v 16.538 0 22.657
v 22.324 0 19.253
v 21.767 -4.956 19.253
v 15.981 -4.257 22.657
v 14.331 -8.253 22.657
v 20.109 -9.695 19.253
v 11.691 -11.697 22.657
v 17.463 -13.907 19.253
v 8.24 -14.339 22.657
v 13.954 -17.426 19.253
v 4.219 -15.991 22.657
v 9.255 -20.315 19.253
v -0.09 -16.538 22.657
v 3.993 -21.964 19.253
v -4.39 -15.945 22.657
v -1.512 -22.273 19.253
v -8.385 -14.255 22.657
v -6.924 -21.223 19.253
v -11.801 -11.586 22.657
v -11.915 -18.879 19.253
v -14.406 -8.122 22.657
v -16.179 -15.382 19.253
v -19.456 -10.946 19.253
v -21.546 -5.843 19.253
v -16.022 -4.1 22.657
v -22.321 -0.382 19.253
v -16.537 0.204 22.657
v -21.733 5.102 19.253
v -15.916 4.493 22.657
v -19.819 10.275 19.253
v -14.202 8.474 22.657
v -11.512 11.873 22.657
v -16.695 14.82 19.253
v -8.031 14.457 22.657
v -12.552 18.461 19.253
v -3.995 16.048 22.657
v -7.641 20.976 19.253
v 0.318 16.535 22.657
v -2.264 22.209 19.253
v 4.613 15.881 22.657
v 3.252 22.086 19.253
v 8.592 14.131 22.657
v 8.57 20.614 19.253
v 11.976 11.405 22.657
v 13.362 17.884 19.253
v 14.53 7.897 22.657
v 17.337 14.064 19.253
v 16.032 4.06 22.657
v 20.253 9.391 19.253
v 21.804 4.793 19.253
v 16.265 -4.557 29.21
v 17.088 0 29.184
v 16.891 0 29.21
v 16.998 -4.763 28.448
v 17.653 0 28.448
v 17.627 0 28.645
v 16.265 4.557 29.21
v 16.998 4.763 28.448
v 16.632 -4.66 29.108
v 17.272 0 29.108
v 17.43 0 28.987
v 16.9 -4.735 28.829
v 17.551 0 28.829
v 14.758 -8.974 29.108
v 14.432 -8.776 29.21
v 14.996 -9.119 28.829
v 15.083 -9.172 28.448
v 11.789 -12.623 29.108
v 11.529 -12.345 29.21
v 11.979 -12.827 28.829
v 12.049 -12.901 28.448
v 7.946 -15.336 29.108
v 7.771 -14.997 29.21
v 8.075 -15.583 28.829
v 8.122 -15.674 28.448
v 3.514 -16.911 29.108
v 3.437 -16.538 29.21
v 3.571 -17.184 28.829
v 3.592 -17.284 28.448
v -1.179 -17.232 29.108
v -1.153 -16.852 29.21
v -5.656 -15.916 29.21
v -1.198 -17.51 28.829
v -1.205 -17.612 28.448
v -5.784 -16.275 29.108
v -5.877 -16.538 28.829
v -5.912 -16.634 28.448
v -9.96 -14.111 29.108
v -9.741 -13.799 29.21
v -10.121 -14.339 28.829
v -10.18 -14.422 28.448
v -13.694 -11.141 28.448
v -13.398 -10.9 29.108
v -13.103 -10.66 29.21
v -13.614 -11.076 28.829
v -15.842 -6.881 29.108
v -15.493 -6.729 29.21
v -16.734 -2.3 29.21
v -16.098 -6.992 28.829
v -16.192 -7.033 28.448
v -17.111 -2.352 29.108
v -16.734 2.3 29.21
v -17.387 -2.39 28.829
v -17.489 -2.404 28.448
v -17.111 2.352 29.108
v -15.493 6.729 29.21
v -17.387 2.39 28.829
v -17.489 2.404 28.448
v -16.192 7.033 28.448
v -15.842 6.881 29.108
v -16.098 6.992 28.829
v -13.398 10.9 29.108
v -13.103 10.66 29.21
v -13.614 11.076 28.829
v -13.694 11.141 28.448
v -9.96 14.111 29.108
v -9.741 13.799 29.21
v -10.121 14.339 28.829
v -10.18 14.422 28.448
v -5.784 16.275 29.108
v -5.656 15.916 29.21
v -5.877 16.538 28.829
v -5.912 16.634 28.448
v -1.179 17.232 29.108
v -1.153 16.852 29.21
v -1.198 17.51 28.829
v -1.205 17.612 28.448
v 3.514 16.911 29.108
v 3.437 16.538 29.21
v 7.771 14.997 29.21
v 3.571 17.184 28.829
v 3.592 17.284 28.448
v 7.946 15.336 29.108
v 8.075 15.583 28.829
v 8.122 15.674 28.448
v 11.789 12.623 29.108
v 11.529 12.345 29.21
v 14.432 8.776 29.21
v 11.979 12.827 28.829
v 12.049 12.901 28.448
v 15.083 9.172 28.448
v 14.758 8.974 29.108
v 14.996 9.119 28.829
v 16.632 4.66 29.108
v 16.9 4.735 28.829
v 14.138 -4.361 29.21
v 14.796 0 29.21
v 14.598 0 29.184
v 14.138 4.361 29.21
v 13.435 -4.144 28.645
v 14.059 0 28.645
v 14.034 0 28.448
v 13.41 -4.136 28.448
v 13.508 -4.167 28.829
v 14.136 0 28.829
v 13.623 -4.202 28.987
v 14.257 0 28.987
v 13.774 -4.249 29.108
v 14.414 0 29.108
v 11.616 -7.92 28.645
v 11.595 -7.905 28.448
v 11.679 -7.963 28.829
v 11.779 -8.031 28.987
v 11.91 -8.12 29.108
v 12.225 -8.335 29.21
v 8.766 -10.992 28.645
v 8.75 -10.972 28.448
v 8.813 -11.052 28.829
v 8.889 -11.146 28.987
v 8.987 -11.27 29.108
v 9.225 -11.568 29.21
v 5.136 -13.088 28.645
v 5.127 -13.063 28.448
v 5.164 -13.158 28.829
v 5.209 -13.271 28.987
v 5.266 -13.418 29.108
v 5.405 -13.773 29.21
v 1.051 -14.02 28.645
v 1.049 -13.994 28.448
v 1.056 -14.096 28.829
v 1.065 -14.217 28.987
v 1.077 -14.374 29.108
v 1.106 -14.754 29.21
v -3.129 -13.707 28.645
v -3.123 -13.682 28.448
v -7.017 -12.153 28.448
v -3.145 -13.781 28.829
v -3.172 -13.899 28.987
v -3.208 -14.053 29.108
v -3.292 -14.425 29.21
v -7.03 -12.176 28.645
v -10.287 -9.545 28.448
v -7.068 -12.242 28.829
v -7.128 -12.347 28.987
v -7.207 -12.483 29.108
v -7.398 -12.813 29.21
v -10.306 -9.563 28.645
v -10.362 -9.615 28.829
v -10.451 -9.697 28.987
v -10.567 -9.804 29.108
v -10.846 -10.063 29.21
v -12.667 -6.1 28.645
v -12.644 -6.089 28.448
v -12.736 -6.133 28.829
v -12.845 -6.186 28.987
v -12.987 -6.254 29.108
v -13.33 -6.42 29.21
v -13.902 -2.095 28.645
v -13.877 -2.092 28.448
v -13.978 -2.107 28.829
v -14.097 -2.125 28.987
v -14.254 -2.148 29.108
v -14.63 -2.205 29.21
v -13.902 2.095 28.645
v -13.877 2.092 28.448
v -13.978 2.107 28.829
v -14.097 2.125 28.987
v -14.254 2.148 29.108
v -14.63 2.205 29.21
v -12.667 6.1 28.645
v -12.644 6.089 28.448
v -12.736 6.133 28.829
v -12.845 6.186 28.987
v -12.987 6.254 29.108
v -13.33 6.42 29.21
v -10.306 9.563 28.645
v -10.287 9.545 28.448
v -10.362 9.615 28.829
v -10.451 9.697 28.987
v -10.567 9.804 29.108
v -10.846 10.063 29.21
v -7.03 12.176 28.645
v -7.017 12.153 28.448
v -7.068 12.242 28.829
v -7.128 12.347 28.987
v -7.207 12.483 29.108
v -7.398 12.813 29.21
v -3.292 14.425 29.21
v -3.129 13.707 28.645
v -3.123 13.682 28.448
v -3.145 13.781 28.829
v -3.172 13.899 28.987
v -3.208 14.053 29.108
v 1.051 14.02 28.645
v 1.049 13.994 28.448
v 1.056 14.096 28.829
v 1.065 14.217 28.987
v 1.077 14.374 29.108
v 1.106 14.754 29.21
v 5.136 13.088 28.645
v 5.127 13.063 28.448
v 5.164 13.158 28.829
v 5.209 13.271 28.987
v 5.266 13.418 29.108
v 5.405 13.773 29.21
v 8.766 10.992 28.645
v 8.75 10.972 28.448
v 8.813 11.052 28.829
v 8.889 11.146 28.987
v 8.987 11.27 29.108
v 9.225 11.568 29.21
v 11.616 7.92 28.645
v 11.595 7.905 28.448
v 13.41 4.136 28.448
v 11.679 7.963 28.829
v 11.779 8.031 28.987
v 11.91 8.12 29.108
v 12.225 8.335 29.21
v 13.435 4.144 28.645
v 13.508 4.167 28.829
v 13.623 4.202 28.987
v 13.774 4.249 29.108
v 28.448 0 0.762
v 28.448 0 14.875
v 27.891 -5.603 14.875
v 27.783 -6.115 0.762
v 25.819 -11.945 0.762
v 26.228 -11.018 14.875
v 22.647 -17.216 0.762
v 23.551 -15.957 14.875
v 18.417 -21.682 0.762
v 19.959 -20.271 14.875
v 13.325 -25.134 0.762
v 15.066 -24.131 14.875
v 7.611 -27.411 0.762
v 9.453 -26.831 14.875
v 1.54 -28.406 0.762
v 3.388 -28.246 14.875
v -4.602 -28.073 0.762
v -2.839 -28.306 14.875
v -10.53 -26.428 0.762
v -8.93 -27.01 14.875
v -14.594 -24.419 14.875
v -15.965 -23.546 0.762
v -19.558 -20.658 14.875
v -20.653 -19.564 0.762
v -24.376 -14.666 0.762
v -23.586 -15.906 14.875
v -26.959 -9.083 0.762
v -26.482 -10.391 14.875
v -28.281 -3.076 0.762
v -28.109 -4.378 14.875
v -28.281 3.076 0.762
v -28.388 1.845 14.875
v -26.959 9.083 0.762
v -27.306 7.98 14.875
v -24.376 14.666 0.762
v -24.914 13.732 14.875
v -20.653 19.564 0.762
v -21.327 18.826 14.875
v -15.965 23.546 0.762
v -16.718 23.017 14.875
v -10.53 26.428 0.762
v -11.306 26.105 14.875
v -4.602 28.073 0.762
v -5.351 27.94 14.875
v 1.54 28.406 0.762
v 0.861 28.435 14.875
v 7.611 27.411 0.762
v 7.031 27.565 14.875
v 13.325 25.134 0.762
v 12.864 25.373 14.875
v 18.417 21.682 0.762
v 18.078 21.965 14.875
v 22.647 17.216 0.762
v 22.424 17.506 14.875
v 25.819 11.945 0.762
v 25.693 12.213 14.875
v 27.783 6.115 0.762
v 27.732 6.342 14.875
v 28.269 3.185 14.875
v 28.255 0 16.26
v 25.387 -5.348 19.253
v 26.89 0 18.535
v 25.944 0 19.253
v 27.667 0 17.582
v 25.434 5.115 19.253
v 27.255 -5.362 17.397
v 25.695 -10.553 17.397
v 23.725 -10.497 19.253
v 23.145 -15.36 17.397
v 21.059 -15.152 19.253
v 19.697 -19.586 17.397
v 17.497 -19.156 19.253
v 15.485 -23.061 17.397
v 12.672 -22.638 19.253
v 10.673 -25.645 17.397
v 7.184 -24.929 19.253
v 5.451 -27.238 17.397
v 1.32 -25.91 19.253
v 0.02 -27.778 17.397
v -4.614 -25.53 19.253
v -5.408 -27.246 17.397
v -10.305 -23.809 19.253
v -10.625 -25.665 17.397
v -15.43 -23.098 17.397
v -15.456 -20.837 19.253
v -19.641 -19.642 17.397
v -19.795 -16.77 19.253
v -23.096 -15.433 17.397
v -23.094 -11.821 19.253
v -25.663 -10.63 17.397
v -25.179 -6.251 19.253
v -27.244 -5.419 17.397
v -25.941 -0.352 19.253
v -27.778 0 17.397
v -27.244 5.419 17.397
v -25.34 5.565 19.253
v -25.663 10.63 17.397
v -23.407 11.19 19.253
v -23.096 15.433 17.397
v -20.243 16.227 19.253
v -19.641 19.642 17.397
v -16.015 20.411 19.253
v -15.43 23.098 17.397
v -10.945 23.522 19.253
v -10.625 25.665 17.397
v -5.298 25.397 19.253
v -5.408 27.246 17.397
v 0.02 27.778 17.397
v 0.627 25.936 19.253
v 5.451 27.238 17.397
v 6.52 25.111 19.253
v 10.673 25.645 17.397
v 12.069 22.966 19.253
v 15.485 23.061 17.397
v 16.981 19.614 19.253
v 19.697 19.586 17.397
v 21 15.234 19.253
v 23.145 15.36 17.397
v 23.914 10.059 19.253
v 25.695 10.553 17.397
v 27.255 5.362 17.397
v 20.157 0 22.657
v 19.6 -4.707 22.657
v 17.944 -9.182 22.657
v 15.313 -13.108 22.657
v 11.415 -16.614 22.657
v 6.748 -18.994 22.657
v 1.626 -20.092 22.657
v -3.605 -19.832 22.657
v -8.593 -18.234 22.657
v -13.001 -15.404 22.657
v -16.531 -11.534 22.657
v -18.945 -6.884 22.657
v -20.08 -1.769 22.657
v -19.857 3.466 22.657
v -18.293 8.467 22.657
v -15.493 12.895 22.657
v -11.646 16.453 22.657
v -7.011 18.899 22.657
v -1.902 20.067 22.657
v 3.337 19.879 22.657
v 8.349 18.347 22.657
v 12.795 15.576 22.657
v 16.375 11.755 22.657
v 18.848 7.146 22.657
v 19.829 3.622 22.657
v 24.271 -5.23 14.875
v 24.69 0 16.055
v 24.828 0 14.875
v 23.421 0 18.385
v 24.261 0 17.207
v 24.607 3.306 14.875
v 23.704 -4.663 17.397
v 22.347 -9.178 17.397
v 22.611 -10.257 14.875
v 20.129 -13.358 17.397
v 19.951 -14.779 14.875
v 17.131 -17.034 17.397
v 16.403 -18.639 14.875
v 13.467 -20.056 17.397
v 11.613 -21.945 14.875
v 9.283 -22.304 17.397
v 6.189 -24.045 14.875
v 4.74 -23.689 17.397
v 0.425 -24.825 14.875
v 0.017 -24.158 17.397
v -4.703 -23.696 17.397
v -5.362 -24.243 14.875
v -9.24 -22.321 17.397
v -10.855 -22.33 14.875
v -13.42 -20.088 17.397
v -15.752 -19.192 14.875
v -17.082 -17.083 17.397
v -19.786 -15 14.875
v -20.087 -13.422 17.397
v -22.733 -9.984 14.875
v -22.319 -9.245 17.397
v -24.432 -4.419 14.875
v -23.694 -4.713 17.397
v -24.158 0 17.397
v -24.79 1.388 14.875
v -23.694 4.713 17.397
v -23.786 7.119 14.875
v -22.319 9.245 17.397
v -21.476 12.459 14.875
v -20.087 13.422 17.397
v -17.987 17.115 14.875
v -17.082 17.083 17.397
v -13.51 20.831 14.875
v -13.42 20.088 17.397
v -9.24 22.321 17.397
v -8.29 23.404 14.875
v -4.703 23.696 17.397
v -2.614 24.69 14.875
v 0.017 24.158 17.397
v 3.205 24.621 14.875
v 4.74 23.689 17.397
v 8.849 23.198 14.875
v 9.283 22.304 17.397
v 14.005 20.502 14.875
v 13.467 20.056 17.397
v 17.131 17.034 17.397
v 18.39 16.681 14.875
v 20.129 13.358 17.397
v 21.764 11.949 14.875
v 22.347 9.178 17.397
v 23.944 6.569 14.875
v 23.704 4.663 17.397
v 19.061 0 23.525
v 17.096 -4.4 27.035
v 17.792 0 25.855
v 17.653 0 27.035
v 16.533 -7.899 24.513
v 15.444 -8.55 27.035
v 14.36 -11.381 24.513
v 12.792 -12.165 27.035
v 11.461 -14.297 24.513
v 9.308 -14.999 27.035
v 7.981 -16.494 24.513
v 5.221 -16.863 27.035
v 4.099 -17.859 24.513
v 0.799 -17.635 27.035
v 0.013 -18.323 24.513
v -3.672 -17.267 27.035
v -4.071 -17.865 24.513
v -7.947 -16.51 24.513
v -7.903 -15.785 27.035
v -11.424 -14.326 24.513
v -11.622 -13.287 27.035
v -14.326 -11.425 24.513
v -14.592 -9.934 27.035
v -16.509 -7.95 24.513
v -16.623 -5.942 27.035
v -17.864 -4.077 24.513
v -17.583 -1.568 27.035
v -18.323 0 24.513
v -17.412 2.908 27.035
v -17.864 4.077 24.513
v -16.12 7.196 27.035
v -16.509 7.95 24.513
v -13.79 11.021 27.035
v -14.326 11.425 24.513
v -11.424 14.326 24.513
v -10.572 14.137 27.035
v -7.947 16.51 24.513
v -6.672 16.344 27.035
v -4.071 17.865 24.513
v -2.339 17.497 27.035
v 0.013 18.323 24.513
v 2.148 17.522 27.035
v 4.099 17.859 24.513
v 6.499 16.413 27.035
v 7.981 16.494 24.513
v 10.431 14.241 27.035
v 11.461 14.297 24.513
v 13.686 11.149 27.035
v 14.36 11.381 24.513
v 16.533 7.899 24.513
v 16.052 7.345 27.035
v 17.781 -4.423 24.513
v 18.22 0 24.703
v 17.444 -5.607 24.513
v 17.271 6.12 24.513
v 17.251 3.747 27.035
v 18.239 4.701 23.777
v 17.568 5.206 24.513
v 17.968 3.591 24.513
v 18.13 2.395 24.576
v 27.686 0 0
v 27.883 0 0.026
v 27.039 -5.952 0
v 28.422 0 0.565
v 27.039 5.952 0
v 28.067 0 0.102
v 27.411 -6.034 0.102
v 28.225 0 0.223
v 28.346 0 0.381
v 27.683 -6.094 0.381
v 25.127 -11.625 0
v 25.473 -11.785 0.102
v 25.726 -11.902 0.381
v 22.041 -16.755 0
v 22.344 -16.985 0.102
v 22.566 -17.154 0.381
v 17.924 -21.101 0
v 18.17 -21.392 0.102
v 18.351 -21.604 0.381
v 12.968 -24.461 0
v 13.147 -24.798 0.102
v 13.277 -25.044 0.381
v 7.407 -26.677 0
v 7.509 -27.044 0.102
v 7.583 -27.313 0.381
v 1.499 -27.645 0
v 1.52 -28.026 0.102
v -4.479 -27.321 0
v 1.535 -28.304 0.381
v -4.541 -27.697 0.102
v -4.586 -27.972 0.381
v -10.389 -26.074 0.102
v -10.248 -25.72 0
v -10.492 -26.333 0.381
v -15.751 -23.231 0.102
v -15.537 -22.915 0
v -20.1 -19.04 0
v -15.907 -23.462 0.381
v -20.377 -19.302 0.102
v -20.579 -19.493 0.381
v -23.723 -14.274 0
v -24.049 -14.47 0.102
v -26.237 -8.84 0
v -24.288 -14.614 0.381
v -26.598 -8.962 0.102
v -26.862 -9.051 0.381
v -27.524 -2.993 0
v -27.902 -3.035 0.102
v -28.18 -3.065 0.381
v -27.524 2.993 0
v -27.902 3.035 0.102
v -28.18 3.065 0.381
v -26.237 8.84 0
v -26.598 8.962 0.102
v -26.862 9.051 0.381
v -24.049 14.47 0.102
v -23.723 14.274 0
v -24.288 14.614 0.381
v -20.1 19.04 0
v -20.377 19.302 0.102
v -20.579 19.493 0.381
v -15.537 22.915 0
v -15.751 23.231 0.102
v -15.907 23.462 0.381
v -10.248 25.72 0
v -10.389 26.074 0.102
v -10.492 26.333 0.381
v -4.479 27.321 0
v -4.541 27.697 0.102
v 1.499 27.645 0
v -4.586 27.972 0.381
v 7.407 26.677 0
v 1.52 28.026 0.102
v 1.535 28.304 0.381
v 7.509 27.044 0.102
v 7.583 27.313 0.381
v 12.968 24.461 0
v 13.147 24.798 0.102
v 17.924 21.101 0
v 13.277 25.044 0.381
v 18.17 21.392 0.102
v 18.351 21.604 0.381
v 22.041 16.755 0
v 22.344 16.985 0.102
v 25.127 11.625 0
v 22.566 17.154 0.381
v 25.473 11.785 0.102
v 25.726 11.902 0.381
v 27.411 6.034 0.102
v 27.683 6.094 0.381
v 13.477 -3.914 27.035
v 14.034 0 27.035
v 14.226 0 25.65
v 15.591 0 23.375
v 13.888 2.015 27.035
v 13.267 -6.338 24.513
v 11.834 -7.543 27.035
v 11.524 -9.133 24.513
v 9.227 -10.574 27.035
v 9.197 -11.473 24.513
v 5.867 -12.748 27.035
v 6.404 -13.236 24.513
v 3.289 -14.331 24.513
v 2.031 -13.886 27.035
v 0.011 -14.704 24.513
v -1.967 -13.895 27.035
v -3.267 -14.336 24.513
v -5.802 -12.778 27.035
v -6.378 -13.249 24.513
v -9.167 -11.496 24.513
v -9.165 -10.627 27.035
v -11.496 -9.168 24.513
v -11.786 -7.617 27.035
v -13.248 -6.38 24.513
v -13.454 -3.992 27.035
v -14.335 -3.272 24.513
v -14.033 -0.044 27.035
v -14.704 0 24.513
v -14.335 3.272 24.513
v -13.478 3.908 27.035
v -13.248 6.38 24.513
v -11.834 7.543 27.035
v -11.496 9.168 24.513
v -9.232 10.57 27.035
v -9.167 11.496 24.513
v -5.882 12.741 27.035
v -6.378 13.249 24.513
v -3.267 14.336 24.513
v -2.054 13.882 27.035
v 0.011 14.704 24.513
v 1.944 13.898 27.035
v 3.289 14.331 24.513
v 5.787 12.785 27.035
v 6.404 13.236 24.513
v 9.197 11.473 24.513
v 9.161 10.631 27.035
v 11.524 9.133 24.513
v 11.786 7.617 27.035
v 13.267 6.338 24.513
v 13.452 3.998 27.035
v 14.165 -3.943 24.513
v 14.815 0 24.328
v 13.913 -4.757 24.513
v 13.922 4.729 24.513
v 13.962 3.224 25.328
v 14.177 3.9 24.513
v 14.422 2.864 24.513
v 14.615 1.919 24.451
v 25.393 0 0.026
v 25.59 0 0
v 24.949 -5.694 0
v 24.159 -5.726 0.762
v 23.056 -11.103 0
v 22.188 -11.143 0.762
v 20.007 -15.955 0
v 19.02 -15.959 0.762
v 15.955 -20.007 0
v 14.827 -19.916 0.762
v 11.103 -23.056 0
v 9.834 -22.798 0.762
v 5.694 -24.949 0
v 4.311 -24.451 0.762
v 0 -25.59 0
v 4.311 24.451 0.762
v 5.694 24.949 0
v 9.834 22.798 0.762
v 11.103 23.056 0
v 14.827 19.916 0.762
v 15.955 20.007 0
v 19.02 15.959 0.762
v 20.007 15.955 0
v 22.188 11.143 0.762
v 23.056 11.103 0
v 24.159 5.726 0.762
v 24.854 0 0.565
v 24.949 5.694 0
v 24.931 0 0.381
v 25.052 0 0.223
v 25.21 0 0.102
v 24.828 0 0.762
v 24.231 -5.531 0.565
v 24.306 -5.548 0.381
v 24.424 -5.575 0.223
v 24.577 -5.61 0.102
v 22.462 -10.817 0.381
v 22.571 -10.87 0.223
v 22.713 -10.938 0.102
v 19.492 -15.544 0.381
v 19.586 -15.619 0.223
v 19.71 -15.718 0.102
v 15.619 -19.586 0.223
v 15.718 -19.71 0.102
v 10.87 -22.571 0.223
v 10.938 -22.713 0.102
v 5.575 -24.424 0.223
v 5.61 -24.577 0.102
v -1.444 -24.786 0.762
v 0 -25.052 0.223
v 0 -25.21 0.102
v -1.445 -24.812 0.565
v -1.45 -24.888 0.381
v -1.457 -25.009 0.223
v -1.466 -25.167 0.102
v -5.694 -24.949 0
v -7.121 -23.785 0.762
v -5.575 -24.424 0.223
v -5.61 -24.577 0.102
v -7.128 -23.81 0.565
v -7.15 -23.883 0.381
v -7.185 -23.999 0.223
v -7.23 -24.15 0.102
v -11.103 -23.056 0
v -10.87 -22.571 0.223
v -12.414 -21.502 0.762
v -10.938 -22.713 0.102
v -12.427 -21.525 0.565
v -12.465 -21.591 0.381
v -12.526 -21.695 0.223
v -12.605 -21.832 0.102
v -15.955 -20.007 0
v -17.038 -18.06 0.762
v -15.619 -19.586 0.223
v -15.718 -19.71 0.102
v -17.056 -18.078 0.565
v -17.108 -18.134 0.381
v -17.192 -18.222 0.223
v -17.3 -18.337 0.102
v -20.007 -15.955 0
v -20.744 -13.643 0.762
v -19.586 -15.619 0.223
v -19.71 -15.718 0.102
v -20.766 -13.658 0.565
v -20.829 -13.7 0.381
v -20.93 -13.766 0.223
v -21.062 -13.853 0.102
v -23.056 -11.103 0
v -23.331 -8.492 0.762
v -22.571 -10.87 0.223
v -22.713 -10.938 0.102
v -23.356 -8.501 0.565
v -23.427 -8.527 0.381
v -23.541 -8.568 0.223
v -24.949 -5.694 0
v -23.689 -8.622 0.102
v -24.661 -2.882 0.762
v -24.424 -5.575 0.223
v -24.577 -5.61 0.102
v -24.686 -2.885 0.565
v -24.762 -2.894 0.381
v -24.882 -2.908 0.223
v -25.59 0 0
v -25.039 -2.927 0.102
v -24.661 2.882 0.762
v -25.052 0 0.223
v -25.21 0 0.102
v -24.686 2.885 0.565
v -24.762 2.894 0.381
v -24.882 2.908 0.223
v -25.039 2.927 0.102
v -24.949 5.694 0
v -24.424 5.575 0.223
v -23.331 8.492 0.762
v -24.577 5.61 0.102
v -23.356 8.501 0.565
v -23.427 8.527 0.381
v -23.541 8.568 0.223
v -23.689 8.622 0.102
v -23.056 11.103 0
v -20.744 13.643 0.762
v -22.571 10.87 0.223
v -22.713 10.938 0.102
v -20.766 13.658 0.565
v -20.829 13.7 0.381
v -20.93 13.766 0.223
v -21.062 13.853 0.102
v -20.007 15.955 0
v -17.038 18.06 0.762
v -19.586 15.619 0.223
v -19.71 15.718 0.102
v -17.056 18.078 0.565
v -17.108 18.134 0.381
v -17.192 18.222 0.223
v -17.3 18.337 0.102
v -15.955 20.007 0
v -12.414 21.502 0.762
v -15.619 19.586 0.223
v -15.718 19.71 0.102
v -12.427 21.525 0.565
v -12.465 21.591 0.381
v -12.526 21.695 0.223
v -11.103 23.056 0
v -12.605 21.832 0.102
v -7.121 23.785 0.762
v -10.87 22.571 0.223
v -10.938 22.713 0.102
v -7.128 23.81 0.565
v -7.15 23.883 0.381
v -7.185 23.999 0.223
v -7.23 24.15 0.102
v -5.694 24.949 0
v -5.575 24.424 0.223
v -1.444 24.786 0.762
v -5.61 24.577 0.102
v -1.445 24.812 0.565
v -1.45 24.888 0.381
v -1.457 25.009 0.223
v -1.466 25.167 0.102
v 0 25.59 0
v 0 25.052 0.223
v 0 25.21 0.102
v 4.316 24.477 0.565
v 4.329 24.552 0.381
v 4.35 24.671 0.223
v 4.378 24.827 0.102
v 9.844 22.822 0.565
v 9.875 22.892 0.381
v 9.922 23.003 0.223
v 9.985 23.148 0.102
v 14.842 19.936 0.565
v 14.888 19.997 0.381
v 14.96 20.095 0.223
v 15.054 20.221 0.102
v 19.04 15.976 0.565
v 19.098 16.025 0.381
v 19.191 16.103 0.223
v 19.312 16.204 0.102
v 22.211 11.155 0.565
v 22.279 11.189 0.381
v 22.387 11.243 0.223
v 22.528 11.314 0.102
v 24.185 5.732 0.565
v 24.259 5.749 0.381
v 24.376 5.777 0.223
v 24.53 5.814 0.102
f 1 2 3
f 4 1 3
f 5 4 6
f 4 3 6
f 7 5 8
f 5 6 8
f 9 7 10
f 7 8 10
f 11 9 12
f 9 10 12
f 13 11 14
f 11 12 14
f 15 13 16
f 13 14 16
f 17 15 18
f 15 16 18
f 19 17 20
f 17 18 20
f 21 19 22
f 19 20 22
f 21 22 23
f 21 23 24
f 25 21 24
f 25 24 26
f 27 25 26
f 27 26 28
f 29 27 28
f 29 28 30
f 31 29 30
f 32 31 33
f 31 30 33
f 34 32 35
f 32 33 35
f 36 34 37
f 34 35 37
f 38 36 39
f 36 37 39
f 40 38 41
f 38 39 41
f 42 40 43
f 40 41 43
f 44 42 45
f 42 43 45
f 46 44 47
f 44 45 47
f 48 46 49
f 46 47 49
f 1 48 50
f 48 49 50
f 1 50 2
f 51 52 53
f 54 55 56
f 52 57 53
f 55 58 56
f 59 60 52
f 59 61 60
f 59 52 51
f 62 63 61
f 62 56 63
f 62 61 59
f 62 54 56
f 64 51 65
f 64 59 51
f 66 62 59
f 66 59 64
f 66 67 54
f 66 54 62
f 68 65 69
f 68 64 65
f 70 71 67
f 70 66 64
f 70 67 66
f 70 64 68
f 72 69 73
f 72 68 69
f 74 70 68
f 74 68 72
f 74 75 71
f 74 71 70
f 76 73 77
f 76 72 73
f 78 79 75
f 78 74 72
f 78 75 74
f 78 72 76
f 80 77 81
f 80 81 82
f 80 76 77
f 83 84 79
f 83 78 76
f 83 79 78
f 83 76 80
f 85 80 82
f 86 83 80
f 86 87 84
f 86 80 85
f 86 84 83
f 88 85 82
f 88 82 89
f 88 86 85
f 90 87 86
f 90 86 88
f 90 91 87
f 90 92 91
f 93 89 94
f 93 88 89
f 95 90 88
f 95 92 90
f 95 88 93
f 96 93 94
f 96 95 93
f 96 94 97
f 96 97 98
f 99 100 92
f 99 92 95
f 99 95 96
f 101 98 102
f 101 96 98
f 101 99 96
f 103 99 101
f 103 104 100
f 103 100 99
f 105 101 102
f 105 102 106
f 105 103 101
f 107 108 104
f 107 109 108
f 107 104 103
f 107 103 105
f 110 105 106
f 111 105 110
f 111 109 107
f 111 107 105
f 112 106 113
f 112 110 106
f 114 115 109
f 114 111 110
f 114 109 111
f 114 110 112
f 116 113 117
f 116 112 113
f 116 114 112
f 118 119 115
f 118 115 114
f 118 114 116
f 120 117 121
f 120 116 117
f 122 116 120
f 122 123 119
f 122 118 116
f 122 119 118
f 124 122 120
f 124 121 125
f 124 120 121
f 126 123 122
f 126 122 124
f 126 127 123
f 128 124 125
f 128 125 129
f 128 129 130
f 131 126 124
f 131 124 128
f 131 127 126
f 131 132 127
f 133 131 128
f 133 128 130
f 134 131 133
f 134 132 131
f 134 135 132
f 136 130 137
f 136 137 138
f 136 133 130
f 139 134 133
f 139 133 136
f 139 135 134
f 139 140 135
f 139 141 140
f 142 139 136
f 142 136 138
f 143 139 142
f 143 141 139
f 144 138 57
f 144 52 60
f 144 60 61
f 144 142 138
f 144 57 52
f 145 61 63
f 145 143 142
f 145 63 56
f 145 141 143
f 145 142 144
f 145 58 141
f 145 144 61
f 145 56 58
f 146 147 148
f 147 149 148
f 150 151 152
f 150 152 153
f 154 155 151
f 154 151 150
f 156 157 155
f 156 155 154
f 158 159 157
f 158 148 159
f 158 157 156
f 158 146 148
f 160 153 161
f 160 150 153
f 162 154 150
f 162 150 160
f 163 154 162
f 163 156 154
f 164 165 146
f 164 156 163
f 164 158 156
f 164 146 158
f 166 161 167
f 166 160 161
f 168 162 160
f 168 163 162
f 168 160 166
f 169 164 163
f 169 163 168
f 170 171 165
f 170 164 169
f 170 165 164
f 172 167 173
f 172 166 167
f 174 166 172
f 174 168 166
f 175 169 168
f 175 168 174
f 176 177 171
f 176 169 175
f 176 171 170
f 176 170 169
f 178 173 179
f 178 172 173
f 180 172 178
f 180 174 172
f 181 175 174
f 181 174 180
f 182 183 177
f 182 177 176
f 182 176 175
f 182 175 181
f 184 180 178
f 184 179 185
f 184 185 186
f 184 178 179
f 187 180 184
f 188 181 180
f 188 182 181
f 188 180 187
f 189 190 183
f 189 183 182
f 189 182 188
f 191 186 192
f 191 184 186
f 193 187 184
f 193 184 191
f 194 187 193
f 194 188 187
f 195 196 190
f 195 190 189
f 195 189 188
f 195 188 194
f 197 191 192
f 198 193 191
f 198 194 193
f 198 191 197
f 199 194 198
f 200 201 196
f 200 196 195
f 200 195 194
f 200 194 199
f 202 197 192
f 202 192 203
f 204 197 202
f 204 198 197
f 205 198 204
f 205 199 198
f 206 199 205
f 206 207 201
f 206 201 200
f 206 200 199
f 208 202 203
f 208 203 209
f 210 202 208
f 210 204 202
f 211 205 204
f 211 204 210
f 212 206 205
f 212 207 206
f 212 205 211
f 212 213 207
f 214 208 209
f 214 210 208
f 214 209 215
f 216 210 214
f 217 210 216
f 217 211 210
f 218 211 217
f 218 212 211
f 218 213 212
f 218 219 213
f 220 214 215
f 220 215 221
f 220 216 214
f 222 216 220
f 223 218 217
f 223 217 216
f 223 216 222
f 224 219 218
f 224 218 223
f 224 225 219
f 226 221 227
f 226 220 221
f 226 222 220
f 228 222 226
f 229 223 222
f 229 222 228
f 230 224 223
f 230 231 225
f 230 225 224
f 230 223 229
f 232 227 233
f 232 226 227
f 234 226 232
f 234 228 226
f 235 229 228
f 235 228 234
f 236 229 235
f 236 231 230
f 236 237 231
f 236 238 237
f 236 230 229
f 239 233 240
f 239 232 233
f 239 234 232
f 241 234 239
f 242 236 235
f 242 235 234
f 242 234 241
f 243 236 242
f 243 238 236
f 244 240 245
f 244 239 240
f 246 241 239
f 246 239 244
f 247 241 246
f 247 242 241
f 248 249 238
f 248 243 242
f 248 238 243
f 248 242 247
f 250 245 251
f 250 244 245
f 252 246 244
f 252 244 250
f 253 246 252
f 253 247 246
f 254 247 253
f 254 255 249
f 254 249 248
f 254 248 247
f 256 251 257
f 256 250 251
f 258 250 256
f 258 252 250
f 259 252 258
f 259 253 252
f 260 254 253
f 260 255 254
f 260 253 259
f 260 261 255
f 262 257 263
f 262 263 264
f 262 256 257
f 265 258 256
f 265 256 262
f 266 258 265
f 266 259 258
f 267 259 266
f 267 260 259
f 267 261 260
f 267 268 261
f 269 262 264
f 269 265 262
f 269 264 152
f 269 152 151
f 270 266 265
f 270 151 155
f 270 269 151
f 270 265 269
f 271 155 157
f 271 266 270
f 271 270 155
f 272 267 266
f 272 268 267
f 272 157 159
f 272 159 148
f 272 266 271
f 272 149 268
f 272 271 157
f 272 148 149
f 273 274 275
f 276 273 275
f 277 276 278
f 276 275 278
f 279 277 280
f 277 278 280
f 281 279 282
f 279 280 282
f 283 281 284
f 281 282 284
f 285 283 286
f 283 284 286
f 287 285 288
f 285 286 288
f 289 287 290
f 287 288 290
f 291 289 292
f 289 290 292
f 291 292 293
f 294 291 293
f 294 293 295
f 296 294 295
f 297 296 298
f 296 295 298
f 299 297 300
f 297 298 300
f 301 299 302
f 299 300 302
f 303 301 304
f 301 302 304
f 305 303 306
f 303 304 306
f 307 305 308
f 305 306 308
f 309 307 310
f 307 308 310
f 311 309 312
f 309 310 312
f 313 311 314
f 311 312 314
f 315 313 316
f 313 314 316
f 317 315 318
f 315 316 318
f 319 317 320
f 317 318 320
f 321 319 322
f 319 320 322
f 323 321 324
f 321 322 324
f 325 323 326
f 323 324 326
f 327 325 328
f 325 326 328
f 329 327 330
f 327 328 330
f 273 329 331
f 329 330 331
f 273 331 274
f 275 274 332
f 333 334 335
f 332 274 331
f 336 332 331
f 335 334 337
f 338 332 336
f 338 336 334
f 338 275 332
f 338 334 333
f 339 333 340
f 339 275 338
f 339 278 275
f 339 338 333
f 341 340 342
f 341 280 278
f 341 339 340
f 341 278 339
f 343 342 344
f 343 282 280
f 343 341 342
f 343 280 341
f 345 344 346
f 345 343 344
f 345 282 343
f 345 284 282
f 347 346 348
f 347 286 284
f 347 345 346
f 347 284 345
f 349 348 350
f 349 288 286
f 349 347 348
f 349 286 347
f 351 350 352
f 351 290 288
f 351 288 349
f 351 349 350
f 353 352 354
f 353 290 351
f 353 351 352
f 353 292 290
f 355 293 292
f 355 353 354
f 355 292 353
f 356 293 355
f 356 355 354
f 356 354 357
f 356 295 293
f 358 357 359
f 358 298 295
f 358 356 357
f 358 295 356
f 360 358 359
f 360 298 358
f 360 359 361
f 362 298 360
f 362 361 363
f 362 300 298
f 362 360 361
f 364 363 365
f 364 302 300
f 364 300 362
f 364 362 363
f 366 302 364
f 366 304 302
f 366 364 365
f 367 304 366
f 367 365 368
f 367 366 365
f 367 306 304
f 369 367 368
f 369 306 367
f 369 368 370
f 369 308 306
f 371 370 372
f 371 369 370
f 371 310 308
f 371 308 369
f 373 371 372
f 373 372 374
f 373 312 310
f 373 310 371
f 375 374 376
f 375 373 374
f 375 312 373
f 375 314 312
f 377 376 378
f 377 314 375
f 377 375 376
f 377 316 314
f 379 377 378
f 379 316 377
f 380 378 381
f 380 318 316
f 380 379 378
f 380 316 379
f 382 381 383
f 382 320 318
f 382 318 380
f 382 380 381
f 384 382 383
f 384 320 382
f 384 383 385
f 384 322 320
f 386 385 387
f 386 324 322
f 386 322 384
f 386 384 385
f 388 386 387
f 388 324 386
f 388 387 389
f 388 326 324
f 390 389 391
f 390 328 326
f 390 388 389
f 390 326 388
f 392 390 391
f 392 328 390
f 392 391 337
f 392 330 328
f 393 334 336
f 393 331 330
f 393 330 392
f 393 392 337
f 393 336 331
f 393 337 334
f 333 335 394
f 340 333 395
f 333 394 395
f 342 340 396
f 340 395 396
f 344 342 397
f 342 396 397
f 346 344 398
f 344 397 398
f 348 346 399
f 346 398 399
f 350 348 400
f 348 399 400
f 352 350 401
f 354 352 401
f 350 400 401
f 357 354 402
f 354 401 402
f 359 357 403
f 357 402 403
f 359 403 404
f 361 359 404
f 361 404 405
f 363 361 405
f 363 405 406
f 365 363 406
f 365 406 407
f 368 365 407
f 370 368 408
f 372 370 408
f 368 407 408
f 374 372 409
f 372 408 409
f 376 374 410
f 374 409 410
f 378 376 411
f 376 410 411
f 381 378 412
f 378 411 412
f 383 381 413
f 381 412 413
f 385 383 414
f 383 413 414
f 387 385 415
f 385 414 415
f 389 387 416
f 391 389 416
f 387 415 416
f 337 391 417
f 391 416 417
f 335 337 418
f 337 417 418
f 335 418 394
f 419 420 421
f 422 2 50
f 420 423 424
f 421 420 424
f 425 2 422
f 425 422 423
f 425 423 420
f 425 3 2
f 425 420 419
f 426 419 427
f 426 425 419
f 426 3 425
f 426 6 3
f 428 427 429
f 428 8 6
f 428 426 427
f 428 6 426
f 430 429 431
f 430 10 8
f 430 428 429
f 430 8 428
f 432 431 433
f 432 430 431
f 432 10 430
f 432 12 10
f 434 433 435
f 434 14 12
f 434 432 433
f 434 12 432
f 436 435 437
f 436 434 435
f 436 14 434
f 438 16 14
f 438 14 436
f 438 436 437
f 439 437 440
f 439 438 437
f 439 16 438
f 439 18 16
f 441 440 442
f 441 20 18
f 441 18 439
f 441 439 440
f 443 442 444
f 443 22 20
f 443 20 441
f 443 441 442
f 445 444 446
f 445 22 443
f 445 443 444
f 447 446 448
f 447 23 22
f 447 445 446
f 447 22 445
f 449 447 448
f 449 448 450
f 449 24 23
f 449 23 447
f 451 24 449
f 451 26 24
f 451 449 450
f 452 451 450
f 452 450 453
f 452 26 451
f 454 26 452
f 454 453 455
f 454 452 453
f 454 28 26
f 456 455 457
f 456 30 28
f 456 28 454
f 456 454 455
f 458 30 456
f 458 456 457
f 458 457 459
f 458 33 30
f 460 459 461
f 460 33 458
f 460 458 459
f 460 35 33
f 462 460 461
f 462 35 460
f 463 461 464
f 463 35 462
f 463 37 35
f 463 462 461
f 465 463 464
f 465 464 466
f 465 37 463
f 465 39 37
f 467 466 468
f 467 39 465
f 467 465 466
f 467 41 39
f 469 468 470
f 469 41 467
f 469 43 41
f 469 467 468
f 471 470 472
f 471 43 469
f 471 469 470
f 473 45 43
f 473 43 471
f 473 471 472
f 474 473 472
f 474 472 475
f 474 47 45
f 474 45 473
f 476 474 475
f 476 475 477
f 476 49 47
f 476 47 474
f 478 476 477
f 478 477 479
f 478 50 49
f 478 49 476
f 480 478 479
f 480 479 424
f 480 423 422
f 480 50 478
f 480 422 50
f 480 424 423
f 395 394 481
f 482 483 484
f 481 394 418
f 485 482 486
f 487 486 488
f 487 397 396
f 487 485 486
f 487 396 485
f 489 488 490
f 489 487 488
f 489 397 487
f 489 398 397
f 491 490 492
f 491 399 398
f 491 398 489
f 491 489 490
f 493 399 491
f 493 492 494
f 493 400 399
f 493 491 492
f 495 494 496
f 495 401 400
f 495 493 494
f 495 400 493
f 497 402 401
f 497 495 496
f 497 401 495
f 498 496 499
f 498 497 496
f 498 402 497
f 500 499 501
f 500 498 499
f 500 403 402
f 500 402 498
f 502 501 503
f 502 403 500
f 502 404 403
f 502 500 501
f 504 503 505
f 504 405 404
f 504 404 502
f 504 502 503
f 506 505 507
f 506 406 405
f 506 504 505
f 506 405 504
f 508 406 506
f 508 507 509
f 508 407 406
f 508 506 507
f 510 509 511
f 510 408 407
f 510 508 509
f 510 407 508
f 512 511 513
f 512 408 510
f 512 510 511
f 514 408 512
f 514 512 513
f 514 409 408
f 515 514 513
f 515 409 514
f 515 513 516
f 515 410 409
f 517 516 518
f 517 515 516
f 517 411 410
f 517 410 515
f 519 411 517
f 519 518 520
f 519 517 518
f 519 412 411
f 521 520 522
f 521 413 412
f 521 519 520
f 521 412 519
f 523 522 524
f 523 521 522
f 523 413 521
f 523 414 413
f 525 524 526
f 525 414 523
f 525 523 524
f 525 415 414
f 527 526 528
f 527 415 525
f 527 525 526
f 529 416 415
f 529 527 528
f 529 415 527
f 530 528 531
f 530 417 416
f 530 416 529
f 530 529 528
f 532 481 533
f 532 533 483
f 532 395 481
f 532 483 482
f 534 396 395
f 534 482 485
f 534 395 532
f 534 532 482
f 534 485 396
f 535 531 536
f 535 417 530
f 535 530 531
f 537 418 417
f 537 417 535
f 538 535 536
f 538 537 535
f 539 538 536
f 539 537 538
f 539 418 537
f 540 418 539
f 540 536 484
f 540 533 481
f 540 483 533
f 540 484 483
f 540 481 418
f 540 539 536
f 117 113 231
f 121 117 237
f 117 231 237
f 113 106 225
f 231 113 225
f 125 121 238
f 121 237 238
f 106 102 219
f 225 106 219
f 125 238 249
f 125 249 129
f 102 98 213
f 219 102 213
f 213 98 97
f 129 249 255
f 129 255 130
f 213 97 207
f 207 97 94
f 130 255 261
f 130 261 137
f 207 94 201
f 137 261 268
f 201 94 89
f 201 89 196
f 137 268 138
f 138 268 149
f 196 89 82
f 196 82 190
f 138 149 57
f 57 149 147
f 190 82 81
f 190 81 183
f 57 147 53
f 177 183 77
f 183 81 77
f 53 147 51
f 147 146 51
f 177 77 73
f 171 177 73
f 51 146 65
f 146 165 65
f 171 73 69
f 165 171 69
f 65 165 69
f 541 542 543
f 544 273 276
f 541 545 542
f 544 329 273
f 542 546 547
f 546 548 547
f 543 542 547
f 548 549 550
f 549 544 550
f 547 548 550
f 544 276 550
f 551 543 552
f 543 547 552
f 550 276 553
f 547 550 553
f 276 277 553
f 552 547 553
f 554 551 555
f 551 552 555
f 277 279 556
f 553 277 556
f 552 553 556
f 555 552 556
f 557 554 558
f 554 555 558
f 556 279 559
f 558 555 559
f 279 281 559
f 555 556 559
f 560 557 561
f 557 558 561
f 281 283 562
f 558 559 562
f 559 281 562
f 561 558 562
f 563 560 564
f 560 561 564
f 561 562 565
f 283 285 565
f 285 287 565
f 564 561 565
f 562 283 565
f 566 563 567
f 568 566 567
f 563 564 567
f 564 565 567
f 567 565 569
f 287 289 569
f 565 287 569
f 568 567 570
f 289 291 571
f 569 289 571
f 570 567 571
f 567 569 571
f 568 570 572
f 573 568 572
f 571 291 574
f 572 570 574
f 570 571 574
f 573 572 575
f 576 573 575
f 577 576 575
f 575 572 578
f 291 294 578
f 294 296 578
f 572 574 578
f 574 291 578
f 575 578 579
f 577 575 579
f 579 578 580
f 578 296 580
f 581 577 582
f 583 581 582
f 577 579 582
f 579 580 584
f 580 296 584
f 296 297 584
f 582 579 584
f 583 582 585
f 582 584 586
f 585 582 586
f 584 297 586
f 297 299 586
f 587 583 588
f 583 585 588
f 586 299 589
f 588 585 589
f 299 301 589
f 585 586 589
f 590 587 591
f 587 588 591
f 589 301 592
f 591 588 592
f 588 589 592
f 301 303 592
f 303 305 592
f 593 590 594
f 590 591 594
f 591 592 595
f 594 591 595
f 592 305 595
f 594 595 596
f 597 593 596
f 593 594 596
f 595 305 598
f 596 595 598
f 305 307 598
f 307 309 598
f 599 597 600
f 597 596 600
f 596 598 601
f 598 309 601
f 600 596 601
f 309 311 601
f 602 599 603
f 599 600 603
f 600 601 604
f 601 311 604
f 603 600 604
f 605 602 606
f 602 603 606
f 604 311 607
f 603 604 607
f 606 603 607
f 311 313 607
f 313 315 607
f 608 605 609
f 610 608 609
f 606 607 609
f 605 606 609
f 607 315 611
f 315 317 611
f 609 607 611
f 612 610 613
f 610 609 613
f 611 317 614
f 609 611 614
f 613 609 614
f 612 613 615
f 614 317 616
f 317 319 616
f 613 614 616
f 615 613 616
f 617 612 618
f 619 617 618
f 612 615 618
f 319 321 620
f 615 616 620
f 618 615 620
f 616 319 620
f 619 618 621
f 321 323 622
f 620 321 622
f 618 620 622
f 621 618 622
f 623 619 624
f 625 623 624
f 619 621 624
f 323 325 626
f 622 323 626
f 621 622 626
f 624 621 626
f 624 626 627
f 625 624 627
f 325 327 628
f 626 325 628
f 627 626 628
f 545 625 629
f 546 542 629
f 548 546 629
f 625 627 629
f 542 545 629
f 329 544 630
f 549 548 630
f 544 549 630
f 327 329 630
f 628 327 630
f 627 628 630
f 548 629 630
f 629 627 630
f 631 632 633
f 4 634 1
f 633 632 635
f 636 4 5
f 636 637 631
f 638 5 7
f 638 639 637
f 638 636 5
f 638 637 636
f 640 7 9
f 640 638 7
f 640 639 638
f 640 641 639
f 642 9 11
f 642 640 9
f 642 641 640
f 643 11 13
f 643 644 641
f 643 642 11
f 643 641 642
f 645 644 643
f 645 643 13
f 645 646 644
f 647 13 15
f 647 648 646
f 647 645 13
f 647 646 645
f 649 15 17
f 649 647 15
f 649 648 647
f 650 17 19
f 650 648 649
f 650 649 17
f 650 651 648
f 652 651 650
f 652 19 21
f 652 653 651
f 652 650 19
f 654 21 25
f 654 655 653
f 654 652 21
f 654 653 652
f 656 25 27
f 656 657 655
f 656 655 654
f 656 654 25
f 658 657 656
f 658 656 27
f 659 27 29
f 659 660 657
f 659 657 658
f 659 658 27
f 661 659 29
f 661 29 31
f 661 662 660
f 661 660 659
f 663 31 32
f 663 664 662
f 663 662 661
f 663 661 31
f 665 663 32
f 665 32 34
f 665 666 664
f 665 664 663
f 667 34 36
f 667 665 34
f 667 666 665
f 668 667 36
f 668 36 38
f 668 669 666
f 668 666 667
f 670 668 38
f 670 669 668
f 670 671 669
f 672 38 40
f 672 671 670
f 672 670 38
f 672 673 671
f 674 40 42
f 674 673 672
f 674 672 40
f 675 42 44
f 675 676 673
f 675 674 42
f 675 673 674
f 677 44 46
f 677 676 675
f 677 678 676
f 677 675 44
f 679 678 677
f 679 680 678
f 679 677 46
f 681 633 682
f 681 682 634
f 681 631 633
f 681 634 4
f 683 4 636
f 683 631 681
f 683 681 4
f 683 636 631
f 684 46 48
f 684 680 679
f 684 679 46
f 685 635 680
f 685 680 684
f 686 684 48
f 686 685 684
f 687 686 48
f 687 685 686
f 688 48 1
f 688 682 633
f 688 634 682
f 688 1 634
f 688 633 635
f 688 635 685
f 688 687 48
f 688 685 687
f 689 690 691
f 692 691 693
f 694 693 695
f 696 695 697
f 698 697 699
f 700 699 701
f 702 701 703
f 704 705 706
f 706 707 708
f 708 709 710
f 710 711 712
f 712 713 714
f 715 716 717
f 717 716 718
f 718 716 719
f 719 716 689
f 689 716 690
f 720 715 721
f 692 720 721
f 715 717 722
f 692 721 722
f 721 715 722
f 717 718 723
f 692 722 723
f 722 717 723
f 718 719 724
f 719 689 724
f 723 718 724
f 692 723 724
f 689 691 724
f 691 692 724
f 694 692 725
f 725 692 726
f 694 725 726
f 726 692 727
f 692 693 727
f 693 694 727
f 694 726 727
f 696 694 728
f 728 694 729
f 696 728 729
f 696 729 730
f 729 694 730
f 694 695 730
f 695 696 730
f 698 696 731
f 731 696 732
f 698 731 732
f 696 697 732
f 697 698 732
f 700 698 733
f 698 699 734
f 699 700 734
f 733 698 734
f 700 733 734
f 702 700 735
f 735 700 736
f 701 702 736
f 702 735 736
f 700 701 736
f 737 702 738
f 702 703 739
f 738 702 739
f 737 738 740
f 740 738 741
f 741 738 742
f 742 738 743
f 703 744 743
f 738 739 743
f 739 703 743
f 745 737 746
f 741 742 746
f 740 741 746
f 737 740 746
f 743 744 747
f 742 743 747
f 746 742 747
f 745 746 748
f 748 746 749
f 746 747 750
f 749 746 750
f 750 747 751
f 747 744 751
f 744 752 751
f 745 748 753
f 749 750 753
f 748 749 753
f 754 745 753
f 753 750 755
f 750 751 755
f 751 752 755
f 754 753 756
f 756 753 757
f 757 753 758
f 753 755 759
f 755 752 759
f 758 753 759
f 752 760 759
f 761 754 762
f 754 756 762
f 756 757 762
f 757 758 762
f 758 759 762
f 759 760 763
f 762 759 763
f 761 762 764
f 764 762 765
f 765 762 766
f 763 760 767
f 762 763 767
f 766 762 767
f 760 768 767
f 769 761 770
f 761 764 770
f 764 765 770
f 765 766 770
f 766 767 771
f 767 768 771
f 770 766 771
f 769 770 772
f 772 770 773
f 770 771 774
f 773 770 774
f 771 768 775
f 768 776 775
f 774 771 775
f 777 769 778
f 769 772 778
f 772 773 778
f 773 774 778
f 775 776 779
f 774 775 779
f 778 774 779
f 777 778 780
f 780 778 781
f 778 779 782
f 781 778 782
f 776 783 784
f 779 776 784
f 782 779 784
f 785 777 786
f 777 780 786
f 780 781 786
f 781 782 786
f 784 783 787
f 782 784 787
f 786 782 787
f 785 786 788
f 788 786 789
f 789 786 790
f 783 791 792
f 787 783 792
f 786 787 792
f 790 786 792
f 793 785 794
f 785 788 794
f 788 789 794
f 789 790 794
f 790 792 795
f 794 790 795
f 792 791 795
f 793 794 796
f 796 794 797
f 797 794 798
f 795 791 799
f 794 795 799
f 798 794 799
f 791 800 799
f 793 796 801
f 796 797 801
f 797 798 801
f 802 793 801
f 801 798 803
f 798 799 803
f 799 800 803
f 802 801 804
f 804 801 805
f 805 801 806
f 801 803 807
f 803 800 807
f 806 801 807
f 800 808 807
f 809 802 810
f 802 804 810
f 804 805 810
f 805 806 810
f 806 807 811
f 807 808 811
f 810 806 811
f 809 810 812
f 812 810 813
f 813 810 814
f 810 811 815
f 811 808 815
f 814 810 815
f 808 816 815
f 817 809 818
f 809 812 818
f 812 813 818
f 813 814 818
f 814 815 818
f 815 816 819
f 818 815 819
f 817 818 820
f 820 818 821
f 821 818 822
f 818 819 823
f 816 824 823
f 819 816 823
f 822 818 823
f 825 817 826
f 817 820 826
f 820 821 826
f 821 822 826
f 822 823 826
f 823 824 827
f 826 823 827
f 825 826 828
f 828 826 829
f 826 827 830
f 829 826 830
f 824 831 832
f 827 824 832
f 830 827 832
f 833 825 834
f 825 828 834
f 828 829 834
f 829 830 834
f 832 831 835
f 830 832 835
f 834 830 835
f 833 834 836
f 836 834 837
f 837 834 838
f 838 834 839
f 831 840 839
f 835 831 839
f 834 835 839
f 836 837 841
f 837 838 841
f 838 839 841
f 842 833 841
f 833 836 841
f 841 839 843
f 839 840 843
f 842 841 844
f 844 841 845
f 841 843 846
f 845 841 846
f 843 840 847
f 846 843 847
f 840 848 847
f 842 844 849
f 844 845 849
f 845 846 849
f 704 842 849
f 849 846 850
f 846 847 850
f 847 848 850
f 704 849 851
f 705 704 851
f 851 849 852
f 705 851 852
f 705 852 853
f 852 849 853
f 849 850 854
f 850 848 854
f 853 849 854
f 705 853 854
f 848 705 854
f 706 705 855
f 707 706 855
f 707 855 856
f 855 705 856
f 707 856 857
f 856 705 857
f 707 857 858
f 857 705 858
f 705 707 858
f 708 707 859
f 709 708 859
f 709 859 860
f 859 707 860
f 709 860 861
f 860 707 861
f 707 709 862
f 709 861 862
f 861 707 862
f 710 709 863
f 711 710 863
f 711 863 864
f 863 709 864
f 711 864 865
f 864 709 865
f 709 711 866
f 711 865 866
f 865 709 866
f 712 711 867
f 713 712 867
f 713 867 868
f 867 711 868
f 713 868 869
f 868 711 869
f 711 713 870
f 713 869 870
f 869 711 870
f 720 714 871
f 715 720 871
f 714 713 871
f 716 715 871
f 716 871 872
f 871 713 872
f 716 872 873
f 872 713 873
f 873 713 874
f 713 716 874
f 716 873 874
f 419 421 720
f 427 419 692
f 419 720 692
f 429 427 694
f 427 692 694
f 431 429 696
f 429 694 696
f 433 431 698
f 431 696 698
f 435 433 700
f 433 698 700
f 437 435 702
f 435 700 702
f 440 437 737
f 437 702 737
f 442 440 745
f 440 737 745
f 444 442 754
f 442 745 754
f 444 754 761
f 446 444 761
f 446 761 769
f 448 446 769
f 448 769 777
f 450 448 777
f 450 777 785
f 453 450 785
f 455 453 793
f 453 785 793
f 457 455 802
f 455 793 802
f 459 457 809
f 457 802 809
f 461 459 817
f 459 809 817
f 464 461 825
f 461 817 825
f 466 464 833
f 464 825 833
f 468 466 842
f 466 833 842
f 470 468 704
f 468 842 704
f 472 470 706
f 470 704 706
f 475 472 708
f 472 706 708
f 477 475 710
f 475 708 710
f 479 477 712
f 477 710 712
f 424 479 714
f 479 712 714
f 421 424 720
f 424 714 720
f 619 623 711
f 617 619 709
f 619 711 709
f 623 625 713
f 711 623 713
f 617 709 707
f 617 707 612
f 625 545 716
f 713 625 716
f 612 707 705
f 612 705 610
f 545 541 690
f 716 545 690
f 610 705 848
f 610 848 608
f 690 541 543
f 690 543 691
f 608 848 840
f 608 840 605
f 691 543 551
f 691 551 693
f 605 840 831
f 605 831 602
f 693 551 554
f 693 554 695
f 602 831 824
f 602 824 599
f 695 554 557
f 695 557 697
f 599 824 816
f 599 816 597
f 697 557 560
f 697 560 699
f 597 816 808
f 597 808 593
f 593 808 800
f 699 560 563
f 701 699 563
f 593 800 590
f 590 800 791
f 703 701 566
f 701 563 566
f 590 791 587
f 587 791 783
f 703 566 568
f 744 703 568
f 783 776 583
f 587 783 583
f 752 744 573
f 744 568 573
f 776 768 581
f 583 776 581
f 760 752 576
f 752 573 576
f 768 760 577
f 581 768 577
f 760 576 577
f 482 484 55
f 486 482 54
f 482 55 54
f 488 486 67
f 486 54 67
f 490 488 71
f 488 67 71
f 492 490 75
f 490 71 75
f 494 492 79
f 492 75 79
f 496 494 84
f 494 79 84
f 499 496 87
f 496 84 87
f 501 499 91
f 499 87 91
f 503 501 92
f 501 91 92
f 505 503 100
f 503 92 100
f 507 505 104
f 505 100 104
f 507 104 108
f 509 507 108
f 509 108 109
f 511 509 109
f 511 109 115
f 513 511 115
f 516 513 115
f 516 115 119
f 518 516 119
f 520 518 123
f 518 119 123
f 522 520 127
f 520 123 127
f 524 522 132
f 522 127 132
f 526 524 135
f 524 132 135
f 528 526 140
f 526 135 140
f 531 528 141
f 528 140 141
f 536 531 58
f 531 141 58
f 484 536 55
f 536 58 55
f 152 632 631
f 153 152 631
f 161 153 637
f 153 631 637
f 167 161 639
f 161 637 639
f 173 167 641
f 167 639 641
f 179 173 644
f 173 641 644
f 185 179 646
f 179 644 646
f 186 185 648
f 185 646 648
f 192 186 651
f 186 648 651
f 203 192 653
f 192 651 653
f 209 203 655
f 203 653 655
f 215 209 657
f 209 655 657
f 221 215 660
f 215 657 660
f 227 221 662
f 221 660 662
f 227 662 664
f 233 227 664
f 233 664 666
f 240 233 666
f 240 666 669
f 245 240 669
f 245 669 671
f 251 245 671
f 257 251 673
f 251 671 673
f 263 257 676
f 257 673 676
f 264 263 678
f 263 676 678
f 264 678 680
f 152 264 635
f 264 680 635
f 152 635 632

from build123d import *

# Parameters (mm, degrees)
F2_R = 5.08
F3_R = 0.762


with BuildPart() as f1:
    # F0 (on Front) → F1 (revolve)
    with BuildSketch(Plane.XZ):
        Polygon((17.653, 29.21), (14.0335, 29.21), (14.0335, 24.13), (24.8285, 17.78), (24.8285, 0), (28.448, 0), (28.448, 17.78), (17.653, 24.13), align=None)
    revolve(axis=Axis((0, 0, -0.587802), (0, 0, -1)))

    # F2
    f2_edges = [f1.edges().sort_by_distance(p)[0] for p in [
        (-28.448, 0, 17.78),
        (-17.653, 0, 24.13),
        (-24.8285, 0, 17.78),
        (-14.0335, 0, 24.13),
        (19.431, 0, 20.955),
    ]]
    fillet(f2_edges, radius=F2_R)

    # F3
    f3_edges = [f1.edges().sort_by_distance(p)[0] for p in [
        (-17.653, 0, 29.21),
        (-14.0335, 0, 29.21),
        (-28.448, 0, 0),
        (-24.8285, 0, 0),
    ]]
    fillet(f3_edges, radius=F3_R)


solid = f1.part
